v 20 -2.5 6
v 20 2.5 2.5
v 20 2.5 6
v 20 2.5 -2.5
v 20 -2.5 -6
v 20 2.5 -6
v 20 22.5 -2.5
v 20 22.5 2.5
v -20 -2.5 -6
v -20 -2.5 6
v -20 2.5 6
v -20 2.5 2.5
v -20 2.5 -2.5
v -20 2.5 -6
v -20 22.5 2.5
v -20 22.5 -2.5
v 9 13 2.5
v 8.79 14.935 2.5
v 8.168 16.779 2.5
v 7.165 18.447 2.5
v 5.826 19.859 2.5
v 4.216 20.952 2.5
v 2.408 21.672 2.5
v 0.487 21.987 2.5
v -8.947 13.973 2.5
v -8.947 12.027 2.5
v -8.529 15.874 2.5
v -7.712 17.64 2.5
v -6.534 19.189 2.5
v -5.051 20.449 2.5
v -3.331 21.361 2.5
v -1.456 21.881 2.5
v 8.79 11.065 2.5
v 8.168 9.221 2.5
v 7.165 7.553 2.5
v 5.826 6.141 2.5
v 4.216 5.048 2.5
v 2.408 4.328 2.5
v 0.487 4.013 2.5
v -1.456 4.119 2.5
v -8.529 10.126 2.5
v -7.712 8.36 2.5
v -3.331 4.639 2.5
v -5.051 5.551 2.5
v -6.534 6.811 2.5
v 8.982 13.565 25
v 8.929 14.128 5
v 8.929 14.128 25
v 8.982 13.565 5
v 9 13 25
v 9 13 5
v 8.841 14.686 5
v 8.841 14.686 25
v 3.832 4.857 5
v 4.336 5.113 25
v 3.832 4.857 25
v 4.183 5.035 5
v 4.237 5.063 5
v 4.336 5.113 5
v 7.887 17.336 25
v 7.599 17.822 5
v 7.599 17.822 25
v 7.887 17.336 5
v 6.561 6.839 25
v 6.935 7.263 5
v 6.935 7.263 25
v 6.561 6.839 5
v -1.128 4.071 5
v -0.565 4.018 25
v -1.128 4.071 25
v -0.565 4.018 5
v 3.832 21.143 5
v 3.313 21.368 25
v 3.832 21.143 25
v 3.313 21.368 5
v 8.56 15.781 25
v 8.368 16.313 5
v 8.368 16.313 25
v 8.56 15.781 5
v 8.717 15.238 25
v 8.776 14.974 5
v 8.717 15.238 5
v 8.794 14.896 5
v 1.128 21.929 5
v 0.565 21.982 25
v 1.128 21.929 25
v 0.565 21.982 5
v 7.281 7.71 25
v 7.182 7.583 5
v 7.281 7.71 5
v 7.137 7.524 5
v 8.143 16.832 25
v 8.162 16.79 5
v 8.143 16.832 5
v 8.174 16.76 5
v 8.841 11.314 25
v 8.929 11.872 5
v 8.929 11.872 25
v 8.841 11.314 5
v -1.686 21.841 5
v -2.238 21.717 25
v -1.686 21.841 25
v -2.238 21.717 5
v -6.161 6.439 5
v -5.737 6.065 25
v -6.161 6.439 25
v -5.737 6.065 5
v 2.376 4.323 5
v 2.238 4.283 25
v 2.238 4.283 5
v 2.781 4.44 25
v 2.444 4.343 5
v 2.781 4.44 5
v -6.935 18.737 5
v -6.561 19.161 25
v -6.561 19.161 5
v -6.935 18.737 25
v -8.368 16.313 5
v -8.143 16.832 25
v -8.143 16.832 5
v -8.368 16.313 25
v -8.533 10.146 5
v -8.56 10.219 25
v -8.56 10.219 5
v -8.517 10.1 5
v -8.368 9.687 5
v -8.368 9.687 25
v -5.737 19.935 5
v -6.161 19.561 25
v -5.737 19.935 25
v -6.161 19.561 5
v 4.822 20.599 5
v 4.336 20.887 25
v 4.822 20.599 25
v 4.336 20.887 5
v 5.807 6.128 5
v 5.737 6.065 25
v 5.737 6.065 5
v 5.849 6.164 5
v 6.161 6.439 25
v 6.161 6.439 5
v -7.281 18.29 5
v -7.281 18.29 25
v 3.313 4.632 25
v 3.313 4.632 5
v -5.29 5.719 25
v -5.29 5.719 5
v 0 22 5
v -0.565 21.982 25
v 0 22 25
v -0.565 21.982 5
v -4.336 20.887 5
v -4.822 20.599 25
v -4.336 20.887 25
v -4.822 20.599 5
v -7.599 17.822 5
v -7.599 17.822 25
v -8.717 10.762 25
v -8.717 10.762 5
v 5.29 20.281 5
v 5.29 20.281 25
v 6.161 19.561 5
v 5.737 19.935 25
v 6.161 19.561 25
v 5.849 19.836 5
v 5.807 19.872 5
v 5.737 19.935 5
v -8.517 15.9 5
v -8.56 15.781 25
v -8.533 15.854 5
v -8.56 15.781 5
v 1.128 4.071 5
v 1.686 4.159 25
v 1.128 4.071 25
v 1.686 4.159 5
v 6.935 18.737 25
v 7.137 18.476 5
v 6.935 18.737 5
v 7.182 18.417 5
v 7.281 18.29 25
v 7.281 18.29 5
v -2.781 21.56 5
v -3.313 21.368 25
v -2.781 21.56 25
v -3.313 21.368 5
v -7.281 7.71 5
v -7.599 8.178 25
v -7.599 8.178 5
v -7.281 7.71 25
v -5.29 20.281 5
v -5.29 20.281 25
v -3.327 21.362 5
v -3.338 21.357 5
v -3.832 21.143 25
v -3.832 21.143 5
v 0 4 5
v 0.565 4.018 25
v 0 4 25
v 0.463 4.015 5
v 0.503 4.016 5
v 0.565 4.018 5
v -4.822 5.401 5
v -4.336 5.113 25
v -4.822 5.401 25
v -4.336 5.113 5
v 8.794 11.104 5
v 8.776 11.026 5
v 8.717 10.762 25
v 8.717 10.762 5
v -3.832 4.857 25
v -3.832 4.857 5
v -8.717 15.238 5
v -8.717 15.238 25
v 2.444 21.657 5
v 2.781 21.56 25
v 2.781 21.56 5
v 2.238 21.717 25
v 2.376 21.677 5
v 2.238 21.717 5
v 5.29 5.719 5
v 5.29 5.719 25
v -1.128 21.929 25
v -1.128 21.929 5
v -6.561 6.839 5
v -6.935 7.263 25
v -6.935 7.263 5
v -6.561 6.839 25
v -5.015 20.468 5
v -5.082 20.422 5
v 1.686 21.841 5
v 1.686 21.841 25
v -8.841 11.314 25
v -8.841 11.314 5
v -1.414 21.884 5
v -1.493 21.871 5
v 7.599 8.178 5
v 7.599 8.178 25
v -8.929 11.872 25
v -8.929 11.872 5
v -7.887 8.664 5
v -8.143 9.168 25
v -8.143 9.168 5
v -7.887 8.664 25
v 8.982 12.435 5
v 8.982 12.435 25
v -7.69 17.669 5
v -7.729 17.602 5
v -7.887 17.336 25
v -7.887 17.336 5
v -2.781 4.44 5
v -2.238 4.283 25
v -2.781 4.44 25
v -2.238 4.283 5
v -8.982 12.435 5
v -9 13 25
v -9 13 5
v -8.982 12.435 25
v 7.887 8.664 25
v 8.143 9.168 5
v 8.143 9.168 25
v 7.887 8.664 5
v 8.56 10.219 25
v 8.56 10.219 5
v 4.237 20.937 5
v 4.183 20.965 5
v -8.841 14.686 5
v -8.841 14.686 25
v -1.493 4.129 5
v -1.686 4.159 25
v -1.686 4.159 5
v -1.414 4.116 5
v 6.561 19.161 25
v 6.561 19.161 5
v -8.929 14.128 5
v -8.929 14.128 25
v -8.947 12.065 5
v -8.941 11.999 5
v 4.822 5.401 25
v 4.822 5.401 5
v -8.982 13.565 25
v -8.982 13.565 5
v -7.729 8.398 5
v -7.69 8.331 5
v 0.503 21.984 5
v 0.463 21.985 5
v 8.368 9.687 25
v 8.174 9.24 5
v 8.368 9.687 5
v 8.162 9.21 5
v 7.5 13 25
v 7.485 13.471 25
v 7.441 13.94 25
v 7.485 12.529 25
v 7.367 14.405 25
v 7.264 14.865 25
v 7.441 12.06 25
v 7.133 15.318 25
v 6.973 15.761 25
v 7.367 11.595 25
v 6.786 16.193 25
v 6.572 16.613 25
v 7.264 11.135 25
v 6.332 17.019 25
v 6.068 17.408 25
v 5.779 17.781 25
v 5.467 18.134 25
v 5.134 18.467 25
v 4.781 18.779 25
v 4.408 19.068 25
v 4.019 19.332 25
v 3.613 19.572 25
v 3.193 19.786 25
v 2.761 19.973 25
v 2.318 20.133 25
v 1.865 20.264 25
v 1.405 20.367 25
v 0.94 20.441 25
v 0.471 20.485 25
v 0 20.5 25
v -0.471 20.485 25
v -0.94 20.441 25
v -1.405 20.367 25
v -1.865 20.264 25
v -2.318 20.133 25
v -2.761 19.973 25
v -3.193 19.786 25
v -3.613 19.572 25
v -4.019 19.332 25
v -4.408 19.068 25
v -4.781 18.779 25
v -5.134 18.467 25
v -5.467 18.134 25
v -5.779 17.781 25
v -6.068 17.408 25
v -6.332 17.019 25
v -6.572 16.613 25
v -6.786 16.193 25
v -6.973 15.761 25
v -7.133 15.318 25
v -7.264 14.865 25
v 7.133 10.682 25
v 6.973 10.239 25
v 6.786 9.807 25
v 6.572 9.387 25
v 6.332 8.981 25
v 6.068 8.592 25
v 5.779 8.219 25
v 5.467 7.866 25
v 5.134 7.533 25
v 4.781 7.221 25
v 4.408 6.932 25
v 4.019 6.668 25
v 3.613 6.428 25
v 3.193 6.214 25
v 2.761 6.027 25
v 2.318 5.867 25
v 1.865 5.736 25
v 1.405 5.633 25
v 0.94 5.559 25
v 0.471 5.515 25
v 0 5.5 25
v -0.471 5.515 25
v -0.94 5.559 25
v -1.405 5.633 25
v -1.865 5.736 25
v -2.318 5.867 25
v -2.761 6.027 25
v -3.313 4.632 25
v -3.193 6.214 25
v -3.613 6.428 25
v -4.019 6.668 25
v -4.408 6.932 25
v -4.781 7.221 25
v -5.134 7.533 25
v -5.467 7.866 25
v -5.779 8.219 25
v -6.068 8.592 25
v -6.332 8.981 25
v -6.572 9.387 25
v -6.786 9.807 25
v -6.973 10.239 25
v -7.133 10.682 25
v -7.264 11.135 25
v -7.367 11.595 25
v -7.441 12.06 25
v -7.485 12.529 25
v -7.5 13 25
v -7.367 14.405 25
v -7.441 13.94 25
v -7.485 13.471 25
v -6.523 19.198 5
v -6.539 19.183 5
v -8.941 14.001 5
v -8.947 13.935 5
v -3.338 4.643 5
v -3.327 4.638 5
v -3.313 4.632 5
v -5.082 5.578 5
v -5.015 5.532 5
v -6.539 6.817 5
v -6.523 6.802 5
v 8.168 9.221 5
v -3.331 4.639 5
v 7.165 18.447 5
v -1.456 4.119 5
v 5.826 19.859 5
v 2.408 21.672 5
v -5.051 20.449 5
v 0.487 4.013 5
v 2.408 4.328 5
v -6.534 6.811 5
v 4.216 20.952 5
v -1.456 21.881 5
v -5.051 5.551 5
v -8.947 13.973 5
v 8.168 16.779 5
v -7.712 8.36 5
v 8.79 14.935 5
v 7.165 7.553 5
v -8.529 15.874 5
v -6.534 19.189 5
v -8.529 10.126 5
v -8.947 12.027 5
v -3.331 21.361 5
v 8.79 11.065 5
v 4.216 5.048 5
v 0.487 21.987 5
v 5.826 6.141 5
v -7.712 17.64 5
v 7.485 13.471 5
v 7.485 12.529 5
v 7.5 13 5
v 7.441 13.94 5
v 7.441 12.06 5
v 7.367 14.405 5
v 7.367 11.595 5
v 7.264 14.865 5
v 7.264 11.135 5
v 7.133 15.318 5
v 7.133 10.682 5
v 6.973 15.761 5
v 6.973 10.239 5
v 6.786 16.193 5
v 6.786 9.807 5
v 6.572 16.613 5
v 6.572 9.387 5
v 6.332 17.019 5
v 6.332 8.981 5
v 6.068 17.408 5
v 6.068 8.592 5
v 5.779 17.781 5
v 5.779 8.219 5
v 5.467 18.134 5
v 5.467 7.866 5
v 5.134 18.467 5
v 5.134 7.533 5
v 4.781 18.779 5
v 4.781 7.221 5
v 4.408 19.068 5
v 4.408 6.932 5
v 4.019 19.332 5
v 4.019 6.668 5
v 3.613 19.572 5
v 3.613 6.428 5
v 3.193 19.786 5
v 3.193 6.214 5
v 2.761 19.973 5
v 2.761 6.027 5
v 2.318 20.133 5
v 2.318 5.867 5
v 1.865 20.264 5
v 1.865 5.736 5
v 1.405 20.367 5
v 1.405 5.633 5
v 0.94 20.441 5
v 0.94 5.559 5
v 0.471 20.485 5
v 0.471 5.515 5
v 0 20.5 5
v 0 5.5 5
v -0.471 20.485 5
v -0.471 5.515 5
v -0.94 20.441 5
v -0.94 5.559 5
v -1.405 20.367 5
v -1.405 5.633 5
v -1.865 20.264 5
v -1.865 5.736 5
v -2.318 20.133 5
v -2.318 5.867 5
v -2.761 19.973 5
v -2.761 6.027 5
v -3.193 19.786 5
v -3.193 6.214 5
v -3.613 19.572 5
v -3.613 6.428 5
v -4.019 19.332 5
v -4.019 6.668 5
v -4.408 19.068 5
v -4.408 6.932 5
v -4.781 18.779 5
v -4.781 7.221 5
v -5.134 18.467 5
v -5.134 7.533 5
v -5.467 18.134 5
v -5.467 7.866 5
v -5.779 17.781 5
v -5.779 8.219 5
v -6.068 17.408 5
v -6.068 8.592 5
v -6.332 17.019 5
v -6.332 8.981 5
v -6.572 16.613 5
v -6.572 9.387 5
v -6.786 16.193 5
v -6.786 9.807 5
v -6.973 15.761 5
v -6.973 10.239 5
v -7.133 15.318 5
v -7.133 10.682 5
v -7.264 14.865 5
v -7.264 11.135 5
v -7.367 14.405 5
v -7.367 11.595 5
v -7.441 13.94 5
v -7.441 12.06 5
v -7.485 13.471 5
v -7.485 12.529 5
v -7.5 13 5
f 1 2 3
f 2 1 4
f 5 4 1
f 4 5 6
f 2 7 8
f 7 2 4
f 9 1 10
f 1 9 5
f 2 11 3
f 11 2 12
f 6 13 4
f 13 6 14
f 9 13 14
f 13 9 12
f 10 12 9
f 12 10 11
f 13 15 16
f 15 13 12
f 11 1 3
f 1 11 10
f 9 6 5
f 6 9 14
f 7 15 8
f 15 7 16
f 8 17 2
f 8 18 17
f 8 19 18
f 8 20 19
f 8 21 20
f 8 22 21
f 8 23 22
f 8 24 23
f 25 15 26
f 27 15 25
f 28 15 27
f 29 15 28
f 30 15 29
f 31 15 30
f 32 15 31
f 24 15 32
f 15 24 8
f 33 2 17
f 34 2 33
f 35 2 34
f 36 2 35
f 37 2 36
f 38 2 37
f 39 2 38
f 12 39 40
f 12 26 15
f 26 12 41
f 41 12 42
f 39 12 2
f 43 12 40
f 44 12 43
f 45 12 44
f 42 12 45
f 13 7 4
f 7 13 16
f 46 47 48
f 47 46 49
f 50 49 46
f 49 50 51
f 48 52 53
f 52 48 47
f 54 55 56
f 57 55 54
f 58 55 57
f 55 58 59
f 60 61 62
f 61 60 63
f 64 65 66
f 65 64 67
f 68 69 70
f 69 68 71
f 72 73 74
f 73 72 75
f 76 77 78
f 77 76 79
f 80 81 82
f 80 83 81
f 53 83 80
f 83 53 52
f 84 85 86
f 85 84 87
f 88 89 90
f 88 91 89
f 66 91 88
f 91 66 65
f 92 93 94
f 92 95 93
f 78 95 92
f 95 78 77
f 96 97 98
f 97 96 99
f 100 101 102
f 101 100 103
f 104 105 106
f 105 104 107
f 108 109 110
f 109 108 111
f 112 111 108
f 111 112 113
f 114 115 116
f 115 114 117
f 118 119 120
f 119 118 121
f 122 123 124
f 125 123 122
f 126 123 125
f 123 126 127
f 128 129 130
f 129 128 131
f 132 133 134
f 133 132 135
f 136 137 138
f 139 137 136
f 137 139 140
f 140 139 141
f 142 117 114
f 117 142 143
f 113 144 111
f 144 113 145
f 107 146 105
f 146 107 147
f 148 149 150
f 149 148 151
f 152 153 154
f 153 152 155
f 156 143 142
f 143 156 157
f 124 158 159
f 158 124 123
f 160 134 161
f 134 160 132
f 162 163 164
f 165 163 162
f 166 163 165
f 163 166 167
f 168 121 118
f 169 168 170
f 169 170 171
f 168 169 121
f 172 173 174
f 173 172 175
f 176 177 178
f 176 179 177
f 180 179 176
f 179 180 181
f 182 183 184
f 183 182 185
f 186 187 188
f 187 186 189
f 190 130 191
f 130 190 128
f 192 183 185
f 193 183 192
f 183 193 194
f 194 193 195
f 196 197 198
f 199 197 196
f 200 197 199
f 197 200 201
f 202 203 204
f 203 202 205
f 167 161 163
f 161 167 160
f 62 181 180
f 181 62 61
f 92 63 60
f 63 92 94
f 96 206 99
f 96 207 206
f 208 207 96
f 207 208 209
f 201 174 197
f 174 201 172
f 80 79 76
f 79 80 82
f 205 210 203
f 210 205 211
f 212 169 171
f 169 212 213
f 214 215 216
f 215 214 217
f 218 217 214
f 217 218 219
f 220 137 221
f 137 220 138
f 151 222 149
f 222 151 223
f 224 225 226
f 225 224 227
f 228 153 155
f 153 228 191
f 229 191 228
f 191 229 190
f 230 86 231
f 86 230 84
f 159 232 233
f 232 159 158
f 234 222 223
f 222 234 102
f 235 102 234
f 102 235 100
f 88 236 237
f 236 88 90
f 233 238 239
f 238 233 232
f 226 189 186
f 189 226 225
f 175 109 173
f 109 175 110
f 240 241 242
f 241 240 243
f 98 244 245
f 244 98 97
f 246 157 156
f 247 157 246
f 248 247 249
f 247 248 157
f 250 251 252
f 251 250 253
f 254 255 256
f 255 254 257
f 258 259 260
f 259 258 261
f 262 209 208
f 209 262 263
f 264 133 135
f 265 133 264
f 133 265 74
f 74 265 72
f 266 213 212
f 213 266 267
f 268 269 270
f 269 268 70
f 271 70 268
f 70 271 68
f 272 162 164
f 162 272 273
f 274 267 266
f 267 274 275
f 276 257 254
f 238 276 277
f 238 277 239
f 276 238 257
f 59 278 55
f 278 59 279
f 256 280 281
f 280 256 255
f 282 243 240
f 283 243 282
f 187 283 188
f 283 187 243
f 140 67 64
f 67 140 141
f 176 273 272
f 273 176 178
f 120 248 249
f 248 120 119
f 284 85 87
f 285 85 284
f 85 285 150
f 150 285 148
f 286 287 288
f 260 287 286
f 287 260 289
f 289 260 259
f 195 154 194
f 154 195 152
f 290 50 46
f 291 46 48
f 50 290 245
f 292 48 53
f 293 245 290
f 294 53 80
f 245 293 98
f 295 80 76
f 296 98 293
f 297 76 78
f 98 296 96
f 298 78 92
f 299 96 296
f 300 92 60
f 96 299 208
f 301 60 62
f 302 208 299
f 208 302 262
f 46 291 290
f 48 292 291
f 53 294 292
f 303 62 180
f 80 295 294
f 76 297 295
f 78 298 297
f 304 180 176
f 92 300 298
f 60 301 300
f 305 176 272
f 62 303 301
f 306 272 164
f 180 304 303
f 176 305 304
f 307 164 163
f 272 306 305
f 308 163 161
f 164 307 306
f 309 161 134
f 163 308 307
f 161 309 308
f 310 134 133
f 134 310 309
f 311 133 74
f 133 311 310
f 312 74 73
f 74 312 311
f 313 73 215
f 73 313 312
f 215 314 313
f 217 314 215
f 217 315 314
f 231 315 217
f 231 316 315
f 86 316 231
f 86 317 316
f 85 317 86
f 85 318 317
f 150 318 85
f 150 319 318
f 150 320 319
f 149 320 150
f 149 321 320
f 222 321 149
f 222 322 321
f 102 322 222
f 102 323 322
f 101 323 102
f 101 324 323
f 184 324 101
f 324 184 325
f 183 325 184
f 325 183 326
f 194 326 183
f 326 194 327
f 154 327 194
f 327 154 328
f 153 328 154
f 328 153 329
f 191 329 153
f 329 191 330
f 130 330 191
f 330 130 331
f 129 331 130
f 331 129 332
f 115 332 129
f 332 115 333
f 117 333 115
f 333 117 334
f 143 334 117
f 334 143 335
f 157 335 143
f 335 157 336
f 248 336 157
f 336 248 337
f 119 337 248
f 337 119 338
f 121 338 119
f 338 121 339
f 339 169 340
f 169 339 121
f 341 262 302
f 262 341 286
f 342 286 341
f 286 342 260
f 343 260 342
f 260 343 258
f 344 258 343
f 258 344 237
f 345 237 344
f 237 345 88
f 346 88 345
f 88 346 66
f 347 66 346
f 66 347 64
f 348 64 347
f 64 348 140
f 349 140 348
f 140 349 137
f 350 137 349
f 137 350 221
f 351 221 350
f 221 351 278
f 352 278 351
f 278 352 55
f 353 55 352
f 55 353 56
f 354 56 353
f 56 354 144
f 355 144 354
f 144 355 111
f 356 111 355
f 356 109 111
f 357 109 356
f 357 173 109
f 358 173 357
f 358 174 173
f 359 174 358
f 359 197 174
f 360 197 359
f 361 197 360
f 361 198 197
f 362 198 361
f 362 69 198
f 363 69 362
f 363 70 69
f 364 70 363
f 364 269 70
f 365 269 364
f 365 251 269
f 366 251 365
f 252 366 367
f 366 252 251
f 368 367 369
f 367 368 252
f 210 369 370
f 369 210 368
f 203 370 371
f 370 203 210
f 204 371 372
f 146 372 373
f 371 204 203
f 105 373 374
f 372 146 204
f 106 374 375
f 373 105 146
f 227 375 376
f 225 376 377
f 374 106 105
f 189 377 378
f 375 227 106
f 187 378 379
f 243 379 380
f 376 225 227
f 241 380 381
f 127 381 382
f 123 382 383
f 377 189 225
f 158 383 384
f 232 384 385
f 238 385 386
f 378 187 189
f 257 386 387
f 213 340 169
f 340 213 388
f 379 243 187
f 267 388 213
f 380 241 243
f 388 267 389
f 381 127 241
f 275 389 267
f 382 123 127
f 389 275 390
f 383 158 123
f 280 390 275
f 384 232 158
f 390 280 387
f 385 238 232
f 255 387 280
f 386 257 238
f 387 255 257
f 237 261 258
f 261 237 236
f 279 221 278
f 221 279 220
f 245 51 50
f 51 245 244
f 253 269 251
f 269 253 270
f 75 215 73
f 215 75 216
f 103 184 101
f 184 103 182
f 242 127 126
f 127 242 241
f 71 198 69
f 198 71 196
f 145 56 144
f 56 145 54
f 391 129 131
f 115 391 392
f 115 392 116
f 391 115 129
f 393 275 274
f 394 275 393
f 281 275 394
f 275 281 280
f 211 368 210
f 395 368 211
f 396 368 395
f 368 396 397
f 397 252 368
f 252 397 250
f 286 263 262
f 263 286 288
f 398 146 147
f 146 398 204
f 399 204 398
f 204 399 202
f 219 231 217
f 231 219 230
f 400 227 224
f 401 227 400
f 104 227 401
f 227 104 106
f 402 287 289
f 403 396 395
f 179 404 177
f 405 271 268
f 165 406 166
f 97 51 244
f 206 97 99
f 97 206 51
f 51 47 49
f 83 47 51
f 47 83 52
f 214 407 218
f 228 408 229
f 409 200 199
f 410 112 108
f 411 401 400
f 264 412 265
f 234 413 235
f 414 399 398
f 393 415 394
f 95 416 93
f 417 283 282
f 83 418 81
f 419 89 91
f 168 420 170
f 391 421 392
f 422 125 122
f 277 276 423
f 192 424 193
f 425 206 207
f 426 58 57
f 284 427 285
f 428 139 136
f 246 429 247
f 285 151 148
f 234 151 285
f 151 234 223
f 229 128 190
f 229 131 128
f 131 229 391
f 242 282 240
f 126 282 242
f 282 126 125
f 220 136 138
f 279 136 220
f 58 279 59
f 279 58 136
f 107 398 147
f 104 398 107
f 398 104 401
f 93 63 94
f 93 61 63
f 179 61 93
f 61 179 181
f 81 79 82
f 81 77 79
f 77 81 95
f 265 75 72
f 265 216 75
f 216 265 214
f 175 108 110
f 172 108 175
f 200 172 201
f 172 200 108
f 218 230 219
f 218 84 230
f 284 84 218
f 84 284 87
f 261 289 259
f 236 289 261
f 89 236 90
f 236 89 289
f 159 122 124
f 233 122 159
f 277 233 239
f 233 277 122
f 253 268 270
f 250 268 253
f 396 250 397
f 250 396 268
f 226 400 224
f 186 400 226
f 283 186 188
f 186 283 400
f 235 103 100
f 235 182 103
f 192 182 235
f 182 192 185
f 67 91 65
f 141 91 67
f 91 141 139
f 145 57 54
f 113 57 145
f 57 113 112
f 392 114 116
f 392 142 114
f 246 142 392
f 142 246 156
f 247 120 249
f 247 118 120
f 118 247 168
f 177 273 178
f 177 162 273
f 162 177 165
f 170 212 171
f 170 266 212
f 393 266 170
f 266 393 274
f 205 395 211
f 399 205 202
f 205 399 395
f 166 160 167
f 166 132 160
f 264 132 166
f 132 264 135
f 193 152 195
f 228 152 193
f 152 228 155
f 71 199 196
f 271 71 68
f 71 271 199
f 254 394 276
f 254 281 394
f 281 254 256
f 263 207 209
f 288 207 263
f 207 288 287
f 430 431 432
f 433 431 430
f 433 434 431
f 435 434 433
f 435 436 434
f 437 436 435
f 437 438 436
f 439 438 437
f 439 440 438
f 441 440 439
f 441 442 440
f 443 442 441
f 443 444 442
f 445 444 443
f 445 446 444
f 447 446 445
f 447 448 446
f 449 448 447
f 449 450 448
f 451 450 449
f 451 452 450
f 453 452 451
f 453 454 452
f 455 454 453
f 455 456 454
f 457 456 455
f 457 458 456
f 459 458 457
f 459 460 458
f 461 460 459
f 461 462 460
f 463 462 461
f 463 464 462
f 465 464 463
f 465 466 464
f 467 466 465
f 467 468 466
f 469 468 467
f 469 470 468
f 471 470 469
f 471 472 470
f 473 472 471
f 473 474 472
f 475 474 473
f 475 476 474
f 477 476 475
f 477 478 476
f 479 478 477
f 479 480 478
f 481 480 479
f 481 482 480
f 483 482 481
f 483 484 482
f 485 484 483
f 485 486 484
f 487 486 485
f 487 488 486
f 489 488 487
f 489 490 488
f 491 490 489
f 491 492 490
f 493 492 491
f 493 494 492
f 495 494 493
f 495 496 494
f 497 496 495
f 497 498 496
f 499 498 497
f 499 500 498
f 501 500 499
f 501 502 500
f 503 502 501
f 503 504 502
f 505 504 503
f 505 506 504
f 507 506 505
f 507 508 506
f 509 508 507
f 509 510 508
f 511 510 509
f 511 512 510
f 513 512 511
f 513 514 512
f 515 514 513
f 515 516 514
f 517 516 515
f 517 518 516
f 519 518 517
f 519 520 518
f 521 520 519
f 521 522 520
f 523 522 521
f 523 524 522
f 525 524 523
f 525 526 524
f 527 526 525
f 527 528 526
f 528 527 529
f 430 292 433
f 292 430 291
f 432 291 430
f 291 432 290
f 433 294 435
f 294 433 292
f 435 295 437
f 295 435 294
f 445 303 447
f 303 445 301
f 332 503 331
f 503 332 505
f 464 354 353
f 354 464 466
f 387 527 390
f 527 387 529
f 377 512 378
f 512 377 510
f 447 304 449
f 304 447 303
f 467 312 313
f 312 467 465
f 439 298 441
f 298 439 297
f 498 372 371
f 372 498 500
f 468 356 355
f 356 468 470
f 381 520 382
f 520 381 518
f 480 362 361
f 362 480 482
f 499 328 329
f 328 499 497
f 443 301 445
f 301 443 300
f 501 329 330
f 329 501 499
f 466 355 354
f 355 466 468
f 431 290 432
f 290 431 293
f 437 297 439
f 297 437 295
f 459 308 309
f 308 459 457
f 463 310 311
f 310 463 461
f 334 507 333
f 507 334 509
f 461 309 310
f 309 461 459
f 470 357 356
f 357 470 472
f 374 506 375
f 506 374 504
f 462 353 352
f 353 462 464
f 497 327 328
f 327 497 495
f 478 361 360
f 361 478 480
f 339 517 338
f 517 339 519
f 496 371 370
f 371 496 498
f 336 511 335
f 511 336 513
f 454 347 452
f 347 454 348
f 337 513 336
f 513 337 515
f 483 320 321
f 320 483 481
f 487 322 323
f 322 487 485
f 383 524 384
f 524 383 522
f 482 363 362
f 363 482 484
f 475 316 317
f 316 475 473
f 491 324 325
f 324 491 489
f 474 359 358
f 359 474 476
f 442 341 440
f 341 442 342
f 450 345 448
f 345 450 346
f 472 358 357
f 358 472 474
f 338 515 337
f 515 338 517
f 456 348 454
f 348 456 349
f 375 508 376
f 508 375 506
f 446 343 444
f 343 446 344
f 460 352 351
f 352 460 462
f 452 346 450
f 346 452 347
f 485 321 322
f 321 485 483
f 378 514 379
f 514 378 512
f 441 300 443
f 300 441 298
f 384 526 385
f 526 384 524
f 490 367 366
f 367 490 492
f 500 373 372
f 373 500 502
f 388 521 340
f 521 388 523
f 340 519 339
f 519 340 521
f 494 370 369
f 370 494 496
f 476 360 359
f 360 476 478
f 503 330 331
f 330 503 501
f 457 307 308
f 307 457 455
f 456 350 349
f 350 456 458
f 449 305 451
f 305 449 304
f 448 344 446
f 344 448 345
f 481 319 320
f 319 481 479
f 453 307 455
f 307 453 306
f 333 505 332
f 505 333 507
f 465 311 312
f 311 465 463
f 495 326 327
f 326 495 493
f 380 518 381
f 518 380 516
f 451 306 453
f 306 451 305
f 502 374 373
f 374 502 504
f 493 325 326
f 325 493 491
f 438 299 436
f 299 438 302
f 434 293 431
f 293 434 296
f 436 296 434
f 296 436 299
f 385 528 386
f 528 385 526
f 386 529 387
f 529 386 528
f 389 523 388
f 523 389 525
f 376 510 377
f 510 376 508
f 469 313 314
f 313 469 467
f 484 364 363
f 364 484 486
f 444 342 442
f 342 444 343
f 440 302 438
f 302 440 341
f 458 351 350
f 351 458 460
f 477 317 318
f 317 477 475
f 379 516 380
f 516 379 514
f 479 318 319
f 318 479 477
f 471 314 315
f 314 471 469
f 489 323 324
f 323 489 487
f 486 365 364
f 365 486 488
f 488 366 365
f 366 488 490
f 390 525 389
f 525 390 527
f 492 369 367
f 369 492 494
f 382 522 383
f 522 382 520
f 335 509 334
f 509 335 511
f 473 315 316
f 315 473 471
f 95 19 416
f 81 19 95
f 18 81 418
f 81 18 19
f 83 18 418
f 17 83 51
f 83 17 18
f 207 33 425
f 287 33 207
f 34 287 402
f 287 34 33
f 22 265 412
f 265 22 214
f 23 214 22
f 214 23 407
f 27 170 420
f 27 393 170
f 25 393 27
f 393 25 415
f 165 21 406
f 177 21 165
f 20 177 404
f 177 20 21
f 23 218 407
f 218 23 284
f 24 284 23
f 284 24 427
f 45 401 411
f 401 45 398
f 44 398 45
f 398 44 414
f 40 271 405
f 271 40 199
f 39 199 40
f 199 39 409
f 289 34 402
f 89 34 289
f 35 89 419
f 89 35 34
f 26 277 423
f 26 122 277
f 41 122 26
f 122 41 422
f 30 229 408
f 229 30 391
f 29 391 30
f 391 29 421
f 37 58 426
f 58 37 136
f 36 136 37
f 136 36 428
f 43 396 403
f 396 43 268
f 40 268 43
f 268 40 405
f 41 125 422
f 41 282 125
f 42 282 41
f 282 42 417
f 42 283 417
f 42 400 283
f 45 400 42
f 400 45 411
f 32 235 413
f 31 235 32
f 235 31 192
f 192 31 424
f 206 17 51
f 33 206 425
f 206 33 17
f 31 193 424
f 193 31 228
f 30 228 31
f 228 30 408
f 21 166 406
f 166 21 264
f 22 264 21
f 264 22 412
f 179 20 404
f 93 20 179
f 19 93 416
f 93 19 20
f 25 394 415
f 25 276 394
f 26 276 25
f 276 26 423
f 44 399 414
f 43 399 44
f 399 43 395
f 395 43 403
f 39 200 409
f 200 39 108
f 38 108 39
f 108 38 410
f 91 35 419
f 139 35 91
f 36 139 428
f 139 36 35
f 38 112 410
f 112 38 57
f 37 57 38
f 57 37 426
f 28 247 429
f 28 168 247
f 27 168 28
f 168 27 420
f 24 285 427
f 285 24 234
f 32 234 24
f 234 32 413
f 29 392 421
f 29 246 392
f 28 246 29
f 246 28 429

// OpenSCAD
module rondelle (di, de, e)
{
  $fn=100;
  difference ()
  {
    cylinder (r=de/2, h=e);
    translate ([0,0,-1]) cylinder (r=di/2, h=e+2);
  }
}


_ep=5  ;
_ray = 7.5 ;



/* Tenon */
rotate ([90,0,0]) {
cube ( [ 40, 12 , 5], true ) ;
translate ( [0,0,-10]) {
    cube ([40 , 5 , 25] , true ) ; }

}
/*  Attache tube */
translate ([0,13,0]) {
    cylinder (h=_ep, r = 9) ;
        translate ( [0 , 0 , _ep  ] ) {
        rondelle ( 15 , 18 , 20 ) ;
    }

}
